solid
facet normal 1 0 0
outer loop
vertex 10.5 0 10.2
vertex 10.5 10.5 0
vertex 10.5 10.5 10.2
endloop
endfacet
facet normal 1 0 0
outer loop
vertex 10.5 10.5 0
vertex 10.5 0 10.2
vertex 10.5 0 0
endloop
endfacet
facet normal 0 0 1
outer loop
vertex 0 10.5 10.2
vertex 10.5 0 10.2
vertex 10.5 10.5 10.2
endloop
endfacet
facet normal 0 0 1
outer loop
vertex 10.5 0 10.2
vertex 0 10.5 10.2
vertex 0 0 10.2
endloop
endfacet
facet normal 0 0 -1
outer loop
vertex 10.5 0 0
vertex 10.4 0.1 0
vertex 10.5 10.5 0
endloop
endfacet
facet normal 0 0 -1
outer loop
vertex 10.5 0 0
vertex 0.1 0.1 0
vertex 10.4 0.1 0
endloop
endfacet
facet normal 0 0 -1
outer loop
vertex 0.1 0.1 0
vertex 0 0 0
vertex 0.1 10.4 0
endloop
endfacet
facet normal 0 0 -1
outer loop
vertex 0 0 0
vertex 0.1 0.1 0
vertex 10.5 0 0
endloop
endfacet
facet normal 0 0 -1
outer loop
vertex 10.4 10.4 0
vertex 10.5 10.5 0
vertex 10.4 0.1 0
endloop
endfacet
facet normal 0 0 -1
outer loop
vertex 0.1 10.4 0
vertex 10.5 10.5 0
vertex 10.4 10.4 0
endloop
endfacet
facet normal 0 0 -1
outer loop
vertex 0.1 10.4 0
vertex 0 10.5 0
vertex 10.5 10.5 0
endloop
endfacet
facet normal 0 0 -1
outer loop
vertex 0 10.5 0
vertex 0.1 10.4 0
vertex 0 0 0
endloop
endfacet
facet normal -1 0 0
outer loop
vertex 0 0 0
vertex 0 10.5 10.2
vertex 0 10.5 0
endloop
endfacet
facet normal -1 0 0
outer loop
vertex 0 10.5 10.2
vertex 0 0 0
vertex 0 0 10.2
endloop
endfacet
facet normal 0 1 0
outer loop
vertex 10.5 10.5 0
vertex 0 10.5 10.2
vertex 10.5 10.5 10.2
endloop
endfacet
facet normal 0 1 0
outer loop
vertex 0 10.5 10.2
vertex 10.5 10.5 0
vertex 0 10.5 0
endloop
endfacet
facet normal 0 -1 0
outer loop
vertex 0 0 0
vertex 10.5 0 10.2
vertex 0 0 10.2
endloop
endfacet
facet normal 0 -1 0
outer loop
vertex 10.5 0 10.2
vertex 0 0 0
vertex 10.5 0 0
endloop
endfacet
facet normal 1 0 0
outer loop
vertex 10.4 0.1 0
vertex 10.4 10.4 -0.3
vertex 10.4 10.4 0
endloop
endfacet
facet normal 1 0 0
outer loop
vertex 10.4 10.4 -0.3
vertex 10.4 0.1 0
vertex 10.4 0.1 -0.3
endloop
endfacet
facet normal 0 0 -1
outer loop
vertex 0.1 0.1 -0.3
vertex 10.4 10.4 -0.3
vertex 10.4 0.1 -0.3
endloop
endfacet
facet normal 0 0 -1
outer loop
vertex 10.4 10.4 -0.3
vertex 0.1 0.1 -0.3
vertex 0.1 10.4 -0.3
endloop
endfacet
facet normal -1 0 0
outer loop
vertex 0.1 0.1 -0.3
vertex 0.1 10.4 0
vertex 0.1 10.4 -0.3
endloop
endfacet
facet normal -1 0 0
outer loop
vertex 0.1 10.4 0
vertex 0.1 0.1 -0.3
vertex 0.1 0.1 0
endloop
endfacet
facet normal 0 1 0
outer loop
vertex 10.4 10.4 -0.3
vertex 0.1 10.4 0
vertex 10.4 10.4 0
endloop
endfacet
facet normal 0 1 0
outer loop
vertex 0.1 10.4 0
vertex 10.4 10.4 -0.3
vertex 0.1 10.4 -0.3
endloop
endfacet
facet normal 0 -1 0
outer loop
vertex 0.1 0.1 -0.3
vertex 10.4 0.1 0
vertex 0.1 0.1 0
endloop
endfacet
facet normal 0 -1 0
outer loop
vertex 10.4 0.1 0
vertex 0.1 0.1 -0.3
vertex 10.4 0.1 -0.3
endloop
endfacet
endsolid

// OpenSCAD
a = 10.5;
b = 0.2; // base layer "squize" compensation
c = 0.3; // base layer height

cube(size=[a, a, a-0.3], center=false);
translate([b/2,b/2,-c])
cube(size=[a-b, a-b, c], center=false);
